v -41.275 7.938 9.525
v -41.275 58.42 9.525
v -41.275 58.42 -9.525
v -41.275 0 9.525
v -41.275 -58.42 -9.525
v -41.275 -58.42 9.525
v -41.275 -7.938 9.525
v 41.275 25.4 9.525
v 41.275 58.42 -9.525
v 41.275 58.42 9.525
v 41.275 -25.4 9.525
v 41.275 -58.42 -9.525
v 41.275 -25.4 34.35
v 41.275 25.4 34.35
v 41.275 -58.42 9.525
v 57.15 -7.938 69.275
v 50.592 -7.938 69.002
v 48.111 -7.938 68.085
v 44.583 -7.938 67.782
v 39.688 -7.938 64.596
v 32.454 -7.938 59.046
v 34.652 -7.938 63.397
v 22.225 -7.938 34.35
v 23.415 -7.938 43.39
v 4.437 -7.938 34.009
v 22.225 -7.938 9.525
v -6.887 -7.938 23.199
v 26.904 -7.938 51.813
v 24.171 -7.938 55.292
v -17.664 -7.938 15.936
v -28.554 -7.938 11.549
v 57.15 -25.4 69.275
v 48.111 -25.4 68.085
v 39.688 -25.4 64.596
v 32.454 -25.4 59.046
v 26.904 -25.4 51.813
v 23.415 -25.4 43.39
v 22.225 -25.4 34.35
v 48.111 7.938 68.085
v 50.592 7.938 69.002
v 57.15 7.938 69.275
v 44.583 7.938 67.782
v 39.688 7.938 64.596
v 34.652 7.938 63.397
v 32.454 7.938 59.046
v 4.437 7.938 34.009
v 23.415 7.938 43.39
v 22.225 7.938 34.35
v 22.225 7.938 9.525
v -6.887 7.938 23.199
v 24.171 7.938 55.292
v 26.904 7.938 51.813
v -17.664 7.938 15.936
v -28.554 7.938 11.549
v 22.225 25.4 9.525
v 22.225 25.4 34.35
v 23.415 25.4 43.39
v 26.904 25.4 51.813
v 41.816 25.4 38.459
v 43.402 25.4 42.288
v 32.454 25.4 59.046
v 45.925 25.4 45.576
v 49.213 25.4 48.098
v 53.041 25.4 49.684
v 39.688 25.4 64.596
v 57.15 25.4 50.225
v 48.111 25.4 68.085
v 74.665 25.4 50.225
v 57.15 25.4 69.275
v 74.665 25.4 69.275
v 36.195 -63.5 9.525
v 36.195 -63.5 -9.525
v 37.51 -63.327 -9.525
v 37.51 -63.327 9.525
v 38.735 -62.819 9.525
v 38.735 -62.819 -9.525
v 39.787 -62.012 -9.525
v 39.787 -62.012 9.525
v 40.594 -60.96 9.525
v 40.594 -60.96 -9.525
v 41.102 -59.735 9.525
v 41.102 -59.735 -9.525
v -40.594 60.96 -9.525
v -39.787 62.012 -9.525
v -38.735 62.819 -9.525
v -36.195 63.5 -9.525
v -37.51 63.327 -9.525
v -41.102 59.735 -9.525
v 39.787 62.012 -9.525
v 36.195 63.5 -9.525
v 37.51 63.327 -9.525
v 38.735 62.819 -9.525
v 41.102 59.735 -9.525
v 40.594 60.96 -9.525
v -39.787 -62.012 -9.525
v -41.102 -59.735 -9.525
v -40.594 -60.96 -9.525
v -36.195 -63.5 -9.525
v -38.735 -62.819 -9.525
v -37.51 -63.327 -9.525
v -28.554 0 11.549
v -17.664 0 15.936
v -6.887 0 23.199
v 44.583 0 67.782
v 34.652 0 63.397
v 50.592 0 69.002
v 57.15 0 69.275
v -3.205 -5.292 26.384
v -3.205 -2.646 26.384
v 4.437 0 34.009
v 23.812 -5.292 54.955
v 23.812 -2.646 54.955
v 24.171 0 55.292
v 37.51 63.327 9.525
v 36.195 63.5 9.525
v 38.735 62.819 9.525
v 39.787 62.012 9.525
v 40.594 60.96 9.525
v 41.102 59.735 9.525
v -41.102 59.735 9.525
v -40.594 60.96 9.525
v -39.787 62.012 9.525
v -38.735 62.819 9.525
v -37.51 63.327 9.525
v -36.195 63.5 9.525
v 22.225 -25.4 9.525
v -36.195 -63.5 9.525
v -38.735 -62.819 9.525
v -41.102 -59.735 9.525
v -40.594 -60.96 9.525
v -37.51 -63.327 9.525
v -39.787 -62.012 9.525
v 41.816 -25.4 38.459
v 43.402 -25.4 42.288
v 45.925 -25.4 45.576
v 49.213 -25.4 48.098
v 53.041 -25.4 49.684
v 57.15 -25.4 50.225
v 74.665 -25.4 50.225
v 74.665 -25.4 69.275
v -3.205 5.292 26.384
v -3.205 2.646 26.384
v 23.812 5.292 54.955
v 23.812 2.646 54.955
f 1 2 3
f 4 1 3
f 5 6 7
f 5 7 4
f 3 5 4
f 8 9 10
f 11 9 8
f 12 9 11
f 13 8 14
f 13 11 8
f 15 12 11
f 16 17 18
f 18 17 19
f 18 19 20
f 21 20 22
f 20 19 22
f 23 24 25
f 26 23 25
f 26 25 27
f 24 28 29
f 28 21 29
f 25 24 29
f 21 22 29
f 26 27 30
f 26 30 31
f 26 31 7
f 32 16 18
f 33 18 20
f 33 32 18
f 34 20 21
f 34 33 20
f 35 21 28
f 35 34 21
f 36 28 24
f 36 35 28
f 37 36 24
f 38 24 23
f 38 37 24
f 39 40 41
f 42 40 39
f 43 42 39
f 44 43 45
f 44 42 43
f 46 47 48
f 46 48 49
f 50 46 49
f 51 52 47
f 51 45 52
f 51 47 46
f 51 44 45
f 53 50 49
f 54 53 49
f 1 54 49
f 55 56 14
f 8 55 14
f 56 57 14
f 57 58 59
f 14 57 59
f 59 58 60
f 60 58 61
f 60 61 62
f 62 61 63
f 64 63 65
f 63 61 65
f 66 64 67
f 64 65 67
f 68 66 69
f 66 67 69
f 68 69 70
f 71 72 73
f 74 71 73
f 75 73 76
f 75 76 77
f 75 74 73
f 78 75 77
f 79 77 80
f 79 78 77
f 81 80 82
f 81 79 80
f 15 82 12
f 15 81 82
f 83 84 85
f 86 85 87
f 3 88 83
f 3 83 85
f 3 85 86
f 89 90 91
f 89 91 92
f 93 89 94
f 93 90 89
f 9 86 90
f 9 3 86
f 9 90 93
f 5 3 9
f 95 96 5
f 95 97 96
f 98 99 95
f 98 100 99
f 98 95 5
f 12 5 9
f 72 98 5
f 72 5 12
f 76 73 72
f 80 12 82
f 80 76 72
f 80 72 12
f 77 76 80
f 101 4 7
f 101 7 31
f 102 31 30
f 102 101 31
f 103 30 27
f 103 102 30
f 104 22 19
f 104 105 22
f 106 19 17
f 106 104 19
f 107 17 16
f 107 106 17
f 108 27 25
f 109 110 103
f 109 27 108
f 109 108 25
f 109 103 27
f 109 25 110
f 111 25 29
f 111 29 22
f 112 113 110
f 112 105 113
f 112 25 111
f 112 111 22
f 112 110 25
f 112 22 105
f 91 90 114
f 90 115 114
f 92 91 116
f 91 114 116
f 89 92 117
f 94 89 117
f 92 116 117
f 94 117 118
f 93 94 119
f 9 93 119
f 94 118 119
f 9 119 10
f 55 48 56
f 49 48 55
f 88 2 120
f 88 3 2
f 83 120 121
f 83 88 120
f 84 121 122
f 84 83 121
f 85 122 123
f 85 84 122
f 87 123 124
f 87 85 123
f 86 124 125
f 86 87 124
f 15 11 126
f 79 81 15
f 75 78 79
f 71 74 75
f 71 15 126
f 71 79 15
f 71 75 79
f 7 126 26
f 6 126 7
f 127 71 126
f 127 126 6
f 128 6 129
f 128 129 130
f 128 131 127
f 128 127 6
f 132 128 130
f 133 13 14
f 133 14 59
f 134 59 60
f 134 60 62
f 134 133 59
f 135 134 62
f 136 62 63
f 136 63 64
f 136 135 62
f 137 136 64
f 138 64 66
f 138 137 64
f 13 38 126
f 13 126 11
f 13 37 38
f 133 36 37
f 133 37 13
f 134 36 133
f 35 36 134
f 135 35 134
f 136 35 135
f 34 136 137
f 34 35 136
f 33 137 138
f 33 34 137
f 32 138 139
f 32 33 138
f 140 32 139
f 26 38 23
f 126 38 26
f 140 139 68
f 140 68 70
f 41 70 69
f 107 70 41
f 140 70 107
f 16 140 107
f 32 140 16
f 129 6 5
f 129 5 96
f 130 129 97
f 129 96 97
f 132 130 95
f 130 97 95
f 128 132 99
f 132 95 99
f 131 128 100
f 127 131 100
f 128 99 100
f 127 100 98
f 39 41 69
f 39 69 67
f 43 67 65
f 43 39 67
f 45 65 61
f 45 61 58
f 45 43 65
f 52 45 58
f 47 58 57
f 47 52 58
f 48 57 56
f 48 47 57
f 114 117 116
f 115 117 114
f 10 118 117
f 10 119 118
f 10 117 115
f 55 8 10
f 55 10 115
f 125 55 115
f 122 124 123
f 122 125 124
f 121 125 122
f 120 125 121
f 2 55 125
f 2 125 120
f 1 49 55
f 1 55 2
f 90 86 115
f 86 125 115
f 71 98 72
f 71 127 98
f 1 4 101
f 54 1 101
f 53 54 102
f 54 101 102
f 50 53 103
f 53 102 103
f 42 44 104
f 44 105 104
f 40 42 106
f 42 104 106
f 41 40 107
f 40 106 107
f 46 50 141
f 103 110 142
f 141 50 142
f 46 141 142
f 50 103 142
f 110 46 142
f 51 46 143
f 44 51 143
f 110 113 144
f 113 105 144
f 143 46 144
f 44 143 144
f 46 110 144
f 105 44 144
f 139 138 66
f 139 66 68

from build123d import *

# Parameters (mm, degrees)
F1_DEPTH = 63.5
F0_W     = 2.669878304
F0_H     = 19.05
F2_DEPTH = 25.4
F3_DEPTH = 7.9375
F5_R     = 5.08


# Not quite as in the source:
# - a feature of the source that left no trace in its solid (it failed there, or was rolled back) is left out


with BuildPart() as f1:
    # F0 (on Front) → F1 (new body, symmetric)
    with BuildSketch(Plane.XZ):
        Polygon((22.225, 9.525), (-41.275, 9.525), (-41.275, -9.525), (41.275, -9.525), (41.275, 9.525), align=None)
    extrude(amount=F1_DEPTH, both=True)

    # F0 (on Front) → F2 (join, symmetric)
    with BuildSketch(Plane.XZ):
        with BuildLine():
            Line((22.225, 34.3503219656), (22.225, 9.525))
            Line((22.225, 9.525), (41.275, 9.525))
            Line((41.275, 9.525), (41.275, 34.3503219656))
            ThreePointArc((41.275, 34.3503219656), (45.9246798487, 45.5756421169), (57.15, 50.2253219656))
            Line((57.15, 50.2253219656), (71.9948219351, 50.2253219656))
            Line((71.9948219351, 50.2253219656), (71.9948219351, 69.2753219656))
            Line((71.9948219351, 69.2753219656), (57.15, 69.2753219656))
            ThreePointArc((57.15, 69.2753219656), (32.4542956671, 59.0460262985), (22.225, 34.3503219656))
        make_face()
        with Locations((73.3297610871, 59.7503219656)):
            Rectangle(F0_W, F0_H)
    extrude(amount=F2_DEPTH, both=True)

    # F0 (on Front) → F3 (join, symmetric)
    with BuildSketch(Plane.XZ):
        with BuildLine():
            add(Edge.make_bspline(
                [(-41.275, 9.525), (8.1134410575, 11.8744410574), (14.8591641337, 70.7333981991), (57.15, 69.2753219656)],
                knots=[0, 0, 0, 0, 115.1415719885, 115.1415719885, 115.1415719885, 115.1415719885], degree=3))
            Line((-41.275, 9.525), (22.225, 9.525))
            Line((22.225, 9.525), (22.225, 34.3503219656))
            ThreePointArc((22.225, 34.3503219656), (32.4542956671, 59.0460262985), (57.15, 69.2753219656))
        make_face()
    extrude(amount=F3_DEPTH, both=True)

    # F5
    f5_edges = [f1.edges().sort_by_distance(p)[0] for p in [
        (-41.275, -63.5, 0),
        (-41.275, 63.5, 0),
        (41.275, -63.5, 0),
        (41.275, 63.5, 0),
    ]]
    fillet(f5_edges, radius=F5_R)


solid = f1.part
